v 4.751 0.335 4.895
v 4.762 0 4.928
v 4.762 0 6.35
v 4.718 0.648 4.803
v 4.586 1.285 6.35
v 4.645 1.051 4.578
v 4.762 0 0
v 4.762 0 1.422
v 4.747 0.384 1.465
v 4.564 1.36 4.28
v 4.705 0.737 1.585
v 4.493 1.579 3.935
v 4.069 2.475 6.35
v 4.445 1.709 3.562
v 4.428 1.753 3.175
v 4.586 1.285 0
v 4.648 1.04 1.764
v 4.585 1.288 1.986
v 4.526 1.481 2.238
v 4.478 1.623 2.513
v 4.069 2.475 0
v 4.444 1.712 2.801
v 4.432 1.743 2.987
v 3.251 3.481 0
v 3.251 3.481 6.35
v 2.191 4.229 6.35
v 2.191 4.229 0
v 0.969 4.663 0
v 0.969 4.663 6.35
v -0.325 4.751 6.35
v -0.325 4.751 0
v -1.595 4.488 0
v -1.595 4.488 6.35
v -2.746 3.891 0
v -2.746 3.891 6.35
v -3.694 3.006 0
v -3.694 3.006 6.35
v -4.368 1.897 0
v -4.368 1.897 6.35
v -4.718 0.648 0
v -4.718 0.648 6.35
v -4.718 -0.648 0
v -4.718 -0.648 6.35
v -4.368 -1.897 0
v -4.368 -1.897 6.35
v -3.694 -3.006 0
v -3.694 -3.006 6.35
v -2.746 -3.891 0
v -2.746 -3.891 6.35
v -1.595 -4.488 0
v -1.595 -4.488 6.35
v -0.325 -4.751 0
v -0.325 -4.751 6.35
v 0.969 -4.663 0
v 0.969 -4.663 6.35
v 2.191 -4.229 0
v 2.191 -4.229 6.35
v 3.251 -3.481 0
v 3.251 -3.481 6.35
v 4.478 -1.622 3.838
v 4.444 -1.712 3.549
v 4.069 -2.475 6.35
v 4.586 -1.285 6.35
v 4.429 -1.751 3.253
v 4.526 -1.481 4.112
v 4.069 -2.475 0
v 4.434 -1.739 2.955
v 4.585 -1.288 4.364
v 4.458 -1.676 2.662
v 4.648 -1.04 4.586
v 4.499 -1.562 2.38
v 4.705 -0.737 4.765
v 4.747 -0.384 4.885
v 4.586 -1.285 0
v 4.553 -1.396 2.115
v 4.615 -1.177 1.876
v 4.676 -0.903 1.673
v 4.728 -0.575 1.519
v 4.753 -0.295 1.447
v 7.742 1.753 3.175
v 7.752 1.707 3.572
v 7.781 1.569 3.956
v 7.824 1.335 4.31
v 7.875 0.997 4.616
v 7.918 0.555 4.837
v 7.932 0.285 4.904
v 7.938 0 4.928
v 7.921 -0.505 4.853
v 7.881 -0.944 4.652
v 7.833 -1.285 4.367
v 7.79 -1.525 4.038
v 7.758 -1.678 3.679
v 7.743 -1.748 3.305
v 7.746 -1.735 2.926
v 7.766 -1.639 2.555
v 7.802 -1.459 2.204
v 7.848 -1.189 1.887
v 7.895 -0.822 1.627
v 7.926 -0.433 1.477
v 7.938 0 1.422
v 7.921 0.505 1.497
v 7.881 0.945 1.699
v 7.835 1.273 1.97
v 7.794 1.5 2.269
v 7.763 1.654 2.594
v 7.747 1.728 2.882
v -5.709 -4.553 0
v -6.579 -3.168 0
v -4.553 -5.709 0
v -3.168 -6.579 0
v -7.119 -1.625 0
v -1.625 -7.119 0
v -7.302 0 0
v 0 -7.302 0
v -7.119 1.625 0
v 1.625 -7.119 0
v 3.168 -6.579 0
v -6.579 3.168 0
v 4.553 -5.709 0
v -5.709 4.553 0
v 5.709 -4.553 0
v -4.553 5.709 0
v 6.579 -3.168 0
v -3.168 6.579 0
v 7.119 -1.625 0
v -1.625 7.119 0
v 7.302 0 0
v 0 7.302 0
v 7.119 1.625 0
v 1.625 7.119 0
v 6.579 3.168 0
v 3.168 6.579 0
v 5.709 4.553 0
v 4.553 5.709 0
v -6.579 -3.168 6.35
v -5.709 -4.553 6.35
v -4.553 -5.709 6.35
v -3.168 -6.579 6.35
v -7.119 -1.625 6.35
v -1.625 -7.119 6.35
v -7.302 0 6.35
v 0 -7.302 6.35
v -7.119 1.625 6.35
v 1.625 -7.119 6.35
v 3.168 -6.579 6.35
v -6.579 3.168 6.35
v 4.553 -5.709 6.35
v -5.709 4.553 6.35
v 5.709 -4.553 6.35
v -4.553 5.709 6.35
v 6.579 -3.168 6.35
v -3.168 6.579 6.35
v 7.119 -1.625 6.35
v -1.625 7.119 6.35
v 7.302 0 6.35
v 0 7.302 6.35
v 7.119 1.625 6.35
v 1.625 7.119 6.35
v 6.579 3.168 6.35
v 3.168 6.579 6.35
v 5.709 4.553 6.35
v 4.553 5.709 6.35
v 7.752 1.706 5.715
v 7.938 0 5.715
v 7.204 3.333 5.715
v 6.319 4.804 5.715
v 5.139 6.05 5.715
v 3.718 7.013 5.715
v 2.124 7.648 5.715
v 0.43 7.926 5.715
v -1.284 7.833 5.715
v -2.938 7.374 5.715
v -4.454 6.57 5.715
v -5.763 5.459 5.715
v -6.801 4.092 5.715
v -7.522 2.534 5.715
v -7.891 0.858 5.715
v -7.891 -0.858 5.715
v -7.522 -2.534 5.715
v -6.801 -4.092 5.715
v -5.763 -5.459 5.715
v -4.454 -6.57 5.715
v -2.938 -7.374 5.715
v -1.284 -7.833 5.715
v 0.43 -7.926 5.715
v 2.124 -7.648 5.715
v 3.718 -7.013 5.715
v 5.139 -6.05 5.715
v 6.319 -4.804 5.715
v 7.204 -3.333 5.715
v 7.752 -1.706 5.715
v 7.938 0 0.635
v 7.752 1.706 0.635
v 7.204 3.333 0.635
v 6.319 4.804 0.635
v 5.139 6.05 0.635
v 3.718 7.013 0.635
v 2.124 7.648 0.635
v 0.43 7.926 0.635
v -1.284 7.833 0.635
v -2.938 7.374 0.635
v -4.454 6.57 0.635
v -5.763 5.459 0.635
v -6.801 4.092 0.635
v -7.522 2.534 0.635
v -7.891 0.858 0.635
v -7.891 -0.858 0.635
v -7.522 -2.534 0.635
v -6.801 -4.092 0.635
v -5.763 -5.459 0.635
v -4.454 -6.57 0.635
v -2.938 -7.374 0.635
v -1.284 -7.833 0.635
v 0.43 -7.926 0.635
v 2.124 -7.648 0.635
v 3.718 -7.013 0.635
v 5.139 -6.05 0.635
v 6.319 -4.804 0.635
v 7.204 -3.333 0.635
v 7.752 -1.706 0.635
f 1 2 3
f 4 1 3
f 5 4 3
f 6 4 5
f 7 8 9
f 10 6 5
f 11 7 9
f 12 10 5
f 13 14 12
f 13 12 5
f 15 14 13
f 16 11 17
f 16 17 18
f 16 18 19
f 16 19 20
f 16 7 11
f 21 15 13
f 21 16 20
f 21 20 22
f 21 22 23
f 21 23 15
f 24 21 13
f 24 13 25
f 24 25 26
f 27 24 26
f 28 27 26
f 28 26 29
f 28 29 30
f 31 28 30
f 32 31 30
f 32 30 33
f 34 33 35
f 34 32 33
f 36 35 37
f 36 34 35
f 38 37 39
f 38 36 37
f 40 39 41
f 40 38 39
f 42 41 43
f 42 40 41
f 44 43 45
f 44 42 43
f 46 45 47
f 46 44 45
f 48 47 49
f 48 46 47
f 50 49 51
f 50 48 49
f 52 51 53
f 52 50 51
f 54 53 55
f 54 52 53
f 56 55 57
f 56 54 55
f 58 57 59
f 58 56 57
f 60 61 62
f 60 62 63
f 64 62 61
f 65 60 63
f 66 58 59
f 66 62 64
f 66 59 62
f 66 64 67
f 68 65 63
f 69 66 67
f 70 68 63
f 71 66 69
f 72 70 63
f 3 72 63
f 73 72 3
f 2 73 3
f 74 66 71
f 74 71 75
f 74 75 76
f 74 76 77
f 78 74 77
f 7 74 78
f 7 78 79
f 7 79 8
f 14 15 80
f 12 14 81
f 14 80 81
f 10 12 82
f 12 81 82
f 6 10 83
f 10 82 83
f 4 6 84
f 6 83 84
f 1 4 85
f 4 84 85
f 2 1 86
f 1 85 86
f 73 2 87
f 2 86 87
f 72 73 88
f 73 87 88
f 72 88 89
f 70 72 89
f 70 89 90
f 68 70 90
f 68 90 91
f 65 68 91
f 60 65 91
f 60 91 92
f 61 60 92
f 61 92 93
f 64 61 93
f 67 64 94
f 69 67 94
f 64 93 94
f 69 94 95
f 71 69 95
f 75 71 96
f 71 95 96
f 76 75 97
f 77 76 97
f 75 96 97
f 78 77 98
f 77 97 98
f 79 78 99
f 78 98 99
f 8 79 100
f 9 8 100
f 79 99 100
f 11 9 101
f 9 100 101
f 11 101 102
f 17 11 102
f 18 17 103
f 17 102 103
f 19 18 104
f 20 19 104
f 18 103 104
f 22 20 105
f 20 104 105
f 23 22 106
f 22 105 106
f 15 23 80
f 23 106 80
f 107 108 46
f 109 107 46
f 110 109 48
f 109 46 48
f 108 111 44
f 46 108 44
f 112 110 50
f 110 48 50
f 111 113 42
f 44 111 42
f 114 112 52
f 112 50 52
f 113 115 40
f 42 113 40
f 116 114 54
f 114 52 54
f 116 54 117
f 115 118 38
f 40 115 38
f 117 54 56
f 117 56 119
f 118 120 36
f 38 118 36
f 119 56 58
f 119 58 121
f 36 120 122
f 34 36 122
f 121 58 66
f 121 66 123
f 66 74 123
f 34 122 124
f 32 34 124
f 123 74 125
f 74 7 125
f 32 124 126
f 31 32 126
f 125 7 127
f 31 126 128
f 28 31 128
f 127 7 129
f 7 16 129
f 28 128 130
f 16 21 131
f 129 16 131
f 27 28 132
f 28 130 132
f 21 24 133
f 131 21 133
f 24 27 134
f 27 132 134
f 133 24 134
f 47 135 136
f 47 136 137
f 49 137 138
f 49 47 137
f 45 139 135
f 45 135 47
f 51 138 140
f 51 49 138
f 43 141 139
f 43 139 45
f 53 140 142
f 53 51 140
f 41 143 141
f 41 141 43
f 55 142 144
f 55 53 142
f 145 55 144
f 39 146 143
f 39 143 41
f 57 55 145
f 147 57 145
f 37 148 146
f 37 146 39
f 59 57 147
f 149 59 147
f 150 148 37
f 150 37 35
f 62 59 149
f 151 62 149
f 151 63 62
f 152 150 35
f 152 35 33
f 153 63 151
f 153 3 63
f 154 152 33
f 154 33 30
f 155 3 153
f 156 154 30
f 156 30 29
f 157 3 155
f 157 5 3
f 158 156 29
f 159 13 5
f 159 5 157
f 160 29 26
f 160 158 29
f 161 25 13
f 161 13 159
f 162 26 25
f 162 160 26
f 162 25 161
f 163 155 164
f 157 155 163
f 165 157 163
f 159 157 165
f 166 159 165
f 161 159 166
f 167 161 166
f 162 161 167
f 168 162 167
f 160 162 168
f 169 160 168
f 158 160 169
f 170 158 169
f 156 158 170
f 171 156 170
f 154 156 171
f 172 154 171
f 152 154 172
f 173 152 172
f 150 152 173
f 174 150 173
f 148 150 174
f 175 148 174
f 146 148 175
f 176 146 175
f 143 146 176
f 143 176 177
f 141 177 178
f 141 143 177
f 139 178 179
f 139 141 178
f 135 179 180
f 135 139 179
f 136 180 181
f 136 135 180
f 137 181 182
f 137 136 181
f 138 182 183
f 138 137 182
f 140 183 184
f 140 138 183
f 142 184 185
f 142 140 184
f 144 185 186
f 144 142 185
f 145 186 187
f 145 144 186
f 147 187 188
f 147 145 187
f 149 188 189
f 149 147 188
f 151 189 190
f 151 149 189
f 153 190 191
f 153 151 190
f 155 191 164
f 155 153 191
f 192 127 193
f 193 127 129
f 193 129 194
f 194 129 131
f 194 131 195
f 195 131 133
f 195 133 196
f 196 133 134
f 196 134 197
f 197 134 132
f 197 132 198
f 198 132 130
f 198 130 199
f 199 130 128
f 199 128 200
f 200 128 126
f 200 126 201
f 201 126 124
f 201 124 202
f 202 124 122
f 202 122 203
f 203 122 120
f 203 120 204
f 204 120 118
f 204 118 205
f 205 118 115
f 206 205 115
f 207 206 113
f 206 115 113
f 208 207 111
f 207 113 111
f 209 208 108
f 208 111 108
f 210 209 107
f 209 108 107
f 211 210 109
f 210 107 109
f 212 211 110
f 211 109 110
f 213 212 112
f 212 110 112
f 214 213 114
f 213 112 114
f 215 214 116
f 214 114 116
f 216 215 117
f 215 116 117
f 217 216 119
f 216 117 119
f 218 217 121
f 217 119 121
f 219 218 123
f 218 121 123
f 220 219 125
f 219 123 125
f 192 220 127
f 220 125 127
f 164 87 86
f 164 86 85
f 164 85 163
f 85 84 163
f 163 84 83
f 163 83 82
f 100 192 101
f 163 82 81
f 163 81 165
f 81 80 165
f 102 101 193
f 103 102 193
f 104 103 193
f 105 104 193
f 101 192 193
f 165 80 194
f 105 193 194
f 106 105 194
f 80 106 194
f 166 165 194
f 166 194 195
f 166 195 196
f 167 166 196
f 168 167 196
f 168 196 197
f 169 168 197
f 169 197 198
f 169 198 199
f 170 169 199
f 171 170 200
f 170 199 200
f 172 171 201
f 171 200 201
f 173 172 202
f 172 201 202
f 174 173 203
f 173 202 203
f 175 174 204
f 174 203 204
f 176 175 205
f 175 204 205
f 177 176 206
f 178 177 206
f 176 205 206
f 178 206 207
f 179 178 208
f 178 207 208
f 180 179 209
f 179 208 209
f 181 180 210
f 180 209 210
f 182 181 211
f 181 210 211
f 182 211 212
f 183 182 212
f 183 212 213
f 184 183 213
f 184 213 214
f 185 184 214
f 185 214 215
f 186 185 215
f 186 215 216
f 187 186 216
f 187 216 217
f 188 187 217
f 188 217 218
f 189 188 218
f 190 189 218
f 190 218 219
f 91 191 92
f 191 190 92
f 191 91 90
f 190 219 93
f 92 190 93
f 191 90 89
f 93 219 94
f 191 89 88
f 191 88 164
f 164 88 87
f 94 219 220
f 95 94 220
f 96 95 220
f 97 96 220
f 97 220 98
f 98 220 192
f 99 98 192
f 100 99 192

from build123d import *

# Parameters (mm, degrees)
F0_R     = 7.9375
F0_R_2   = 4.7625
F1_DEPTH = 6.35
F3_R     = 1.7526
F4_DEPTH = 5.08
F5_SIZE  = 0.635


with BuildPart() as f1:
    # F0 (on Top) → F1 (new body)
    with BuildSketch(Plane.XY):
        Circle(F0_R)
        Circle(F0_R_2, mode=Mode.SUBTRACT)
    extrude(amount=F1_DEPTH)

    # F3 (on offset) → F4 (cut)
    with BuildSketch(Plane.YZ.offset(7.9375)):
        with Locations((0, 3.175)):
            Circle(F3_R)
    extrude(amount=-F4_DEPTH, mode=Mode.SUBTRACT)

    # F5
    f5_edges = [f1.edges().sort_by_distance(p)[0] for p in [
        (-7.9375, 0, 6.35),
        (-7.9375, 0, 0),
    ]]
    chamfer(f5_edges, length=F5_SIZE)


solid = f1.part
